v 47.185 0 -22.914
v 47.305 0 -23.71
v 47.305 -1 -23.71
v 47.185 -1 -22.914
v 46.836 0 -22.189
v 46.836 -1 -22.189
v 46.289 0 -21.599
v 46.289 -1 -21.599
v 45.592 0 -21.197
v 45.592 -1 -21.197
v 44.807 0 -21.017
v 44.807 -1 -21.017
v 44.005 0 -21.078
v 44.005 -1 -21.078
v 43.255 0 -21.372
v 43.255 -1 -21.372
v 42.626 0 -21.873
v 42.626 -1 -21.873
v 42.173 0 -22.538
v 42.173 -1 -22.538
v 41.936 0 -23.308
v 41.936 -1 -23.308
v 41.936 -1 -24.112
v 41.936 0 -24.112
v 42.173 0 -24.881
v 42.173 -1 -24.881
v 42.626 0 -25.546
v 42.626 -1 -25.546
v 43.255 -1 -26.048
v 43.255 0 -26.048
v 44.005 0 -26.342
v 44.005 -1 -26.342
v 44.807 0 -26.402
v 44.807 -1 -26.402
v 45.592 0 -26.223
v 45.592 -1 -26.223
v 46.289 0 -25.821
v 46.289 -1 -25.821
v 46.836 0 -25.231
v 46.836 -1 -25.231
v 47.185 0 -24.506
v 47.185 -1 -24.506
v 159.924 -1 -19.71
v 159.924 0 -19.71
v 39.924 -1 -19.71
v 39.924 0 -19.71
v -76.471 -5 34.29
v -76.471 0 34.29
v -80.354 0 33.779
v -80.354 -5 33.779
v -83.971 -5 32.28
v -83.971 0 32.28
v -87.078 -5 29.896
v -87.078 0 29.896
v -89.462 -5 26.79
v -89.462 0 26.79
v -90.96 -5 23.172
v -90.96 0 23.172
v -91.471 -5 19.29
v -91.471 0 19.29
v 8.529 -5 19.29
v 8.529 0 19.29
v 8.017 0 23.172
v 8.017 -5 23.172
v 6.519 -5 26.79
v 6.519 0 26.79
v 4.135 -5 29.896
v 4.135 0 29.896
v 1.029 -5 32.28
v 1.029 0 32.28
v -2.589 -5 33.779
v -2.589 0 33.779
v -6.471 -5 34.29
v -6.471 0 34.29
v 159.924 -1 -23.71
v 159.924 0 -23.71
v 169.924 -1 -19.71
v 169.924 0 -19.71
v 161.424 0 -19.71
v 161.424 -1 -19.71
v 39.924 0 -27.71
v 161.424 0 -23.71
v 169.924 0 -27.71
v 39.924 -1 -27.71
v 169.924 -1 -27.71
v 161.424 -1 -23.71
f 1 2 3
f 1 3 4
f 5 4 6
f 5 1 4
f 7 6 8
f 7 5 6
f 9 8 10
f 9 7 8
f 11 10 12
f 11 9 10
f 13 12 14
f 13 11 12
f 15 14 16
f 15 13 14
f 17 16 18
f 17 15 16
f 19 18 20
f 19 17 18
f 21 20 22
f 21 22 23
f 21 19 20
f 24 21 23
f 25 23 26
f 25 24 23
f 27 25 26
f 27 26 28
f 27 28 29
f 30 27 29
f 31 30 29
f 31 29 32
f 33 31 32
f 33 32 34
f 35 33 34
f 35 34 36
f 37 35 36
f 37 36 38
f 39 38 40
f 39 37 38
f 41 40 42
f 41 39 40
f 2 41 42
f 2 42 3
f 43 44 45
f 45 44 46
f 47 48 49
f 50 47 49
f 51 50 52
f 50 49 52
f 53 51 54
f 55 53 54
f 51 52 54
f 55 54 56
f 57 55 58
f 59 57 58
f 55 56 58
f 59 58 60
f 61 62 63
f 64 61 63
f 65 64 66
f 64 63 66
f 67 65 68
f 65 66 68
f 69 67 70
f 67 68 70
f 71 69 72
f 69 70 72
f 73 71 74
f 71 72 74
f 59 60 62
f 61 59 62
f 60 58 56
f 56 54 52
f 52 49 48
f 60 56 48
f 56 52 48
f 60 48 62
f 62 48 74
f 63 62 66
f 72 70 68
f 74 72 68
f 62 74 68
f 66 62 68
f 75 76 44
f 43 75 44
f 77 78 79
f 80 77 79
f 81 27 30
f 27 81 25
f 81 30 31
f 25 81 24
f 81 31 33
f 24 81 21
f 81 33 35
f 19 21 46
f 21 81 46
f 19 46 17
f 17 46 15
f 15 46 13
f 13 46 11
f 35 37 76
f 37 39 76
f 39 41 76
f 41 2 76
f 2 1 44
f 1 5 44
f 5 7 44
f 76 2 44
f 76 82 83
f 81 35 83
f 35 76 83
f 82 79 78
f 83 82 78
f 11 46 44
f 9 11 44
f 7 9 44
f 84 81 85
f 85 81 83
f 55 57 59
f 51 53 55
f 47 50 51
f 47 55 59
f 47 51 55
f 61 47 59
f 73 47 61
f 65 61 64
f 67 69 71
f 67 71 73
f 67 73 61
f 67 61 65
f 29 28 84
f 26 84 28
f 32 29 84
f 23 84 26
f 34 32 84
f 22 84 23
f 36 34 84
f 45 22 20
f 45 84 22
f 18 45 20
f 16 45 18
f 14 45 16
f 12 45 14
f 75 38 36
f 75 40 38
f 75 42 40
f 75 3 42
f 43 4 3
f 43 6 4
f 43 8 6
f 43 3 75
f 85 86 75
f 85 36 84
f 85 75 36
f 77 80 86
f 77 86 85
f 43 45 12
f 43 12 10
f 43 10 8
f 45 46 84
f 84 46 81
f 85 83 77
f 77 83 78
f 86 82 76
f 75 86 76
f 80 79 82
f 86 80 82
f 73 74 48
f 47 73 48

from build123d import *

# Parameters (mm, degrees)
F1_DEPTH = 5
F2_R     = 2.7
F3_DEPTH = 1


with BuildPart() as f1:
    # F0 (on Front) → F1 (new body)
    with BuildSketch(Plane.XZ):
        with BuildLine():
            ThreePointArc((-76.471449, 34.289809), (-87.078051, 29.896411), (-91.471449, 19.289809))
            Line((-91.471449, 19.289809), (8.528551, 19.289809))
            ThreePointArc((8.528551, 19.289809), (4.135153, 29.896411), (-6.471449, 34.289809))
            Line((-6.471449, 34.289809), (-76.471449, 34.289809))
        make_face()
    extrude(amount=F1_DEPTH)


with BuildPart() as f3:
    # F2 (on Front) → F3 (new body)
    with BuildSketch(Plane.XZ):
        Polygon((159.923573, -19.709916), (39.923573, -19.709916), (39.923573, -27.709916), (169.923573, -27.709916), (169.923573, -19.709916), (161.423573, -19.709916), (161.423573, -23.709916), (159.923573, -23.709916), align=None)
        with Locations((44.605345, -23.709916)):
            Circle(F2_R, mode=Mode.SUBTRACT)
    extrude(amount=F3_DEPTH)


solid = Compound([f1.part, f3.part])
